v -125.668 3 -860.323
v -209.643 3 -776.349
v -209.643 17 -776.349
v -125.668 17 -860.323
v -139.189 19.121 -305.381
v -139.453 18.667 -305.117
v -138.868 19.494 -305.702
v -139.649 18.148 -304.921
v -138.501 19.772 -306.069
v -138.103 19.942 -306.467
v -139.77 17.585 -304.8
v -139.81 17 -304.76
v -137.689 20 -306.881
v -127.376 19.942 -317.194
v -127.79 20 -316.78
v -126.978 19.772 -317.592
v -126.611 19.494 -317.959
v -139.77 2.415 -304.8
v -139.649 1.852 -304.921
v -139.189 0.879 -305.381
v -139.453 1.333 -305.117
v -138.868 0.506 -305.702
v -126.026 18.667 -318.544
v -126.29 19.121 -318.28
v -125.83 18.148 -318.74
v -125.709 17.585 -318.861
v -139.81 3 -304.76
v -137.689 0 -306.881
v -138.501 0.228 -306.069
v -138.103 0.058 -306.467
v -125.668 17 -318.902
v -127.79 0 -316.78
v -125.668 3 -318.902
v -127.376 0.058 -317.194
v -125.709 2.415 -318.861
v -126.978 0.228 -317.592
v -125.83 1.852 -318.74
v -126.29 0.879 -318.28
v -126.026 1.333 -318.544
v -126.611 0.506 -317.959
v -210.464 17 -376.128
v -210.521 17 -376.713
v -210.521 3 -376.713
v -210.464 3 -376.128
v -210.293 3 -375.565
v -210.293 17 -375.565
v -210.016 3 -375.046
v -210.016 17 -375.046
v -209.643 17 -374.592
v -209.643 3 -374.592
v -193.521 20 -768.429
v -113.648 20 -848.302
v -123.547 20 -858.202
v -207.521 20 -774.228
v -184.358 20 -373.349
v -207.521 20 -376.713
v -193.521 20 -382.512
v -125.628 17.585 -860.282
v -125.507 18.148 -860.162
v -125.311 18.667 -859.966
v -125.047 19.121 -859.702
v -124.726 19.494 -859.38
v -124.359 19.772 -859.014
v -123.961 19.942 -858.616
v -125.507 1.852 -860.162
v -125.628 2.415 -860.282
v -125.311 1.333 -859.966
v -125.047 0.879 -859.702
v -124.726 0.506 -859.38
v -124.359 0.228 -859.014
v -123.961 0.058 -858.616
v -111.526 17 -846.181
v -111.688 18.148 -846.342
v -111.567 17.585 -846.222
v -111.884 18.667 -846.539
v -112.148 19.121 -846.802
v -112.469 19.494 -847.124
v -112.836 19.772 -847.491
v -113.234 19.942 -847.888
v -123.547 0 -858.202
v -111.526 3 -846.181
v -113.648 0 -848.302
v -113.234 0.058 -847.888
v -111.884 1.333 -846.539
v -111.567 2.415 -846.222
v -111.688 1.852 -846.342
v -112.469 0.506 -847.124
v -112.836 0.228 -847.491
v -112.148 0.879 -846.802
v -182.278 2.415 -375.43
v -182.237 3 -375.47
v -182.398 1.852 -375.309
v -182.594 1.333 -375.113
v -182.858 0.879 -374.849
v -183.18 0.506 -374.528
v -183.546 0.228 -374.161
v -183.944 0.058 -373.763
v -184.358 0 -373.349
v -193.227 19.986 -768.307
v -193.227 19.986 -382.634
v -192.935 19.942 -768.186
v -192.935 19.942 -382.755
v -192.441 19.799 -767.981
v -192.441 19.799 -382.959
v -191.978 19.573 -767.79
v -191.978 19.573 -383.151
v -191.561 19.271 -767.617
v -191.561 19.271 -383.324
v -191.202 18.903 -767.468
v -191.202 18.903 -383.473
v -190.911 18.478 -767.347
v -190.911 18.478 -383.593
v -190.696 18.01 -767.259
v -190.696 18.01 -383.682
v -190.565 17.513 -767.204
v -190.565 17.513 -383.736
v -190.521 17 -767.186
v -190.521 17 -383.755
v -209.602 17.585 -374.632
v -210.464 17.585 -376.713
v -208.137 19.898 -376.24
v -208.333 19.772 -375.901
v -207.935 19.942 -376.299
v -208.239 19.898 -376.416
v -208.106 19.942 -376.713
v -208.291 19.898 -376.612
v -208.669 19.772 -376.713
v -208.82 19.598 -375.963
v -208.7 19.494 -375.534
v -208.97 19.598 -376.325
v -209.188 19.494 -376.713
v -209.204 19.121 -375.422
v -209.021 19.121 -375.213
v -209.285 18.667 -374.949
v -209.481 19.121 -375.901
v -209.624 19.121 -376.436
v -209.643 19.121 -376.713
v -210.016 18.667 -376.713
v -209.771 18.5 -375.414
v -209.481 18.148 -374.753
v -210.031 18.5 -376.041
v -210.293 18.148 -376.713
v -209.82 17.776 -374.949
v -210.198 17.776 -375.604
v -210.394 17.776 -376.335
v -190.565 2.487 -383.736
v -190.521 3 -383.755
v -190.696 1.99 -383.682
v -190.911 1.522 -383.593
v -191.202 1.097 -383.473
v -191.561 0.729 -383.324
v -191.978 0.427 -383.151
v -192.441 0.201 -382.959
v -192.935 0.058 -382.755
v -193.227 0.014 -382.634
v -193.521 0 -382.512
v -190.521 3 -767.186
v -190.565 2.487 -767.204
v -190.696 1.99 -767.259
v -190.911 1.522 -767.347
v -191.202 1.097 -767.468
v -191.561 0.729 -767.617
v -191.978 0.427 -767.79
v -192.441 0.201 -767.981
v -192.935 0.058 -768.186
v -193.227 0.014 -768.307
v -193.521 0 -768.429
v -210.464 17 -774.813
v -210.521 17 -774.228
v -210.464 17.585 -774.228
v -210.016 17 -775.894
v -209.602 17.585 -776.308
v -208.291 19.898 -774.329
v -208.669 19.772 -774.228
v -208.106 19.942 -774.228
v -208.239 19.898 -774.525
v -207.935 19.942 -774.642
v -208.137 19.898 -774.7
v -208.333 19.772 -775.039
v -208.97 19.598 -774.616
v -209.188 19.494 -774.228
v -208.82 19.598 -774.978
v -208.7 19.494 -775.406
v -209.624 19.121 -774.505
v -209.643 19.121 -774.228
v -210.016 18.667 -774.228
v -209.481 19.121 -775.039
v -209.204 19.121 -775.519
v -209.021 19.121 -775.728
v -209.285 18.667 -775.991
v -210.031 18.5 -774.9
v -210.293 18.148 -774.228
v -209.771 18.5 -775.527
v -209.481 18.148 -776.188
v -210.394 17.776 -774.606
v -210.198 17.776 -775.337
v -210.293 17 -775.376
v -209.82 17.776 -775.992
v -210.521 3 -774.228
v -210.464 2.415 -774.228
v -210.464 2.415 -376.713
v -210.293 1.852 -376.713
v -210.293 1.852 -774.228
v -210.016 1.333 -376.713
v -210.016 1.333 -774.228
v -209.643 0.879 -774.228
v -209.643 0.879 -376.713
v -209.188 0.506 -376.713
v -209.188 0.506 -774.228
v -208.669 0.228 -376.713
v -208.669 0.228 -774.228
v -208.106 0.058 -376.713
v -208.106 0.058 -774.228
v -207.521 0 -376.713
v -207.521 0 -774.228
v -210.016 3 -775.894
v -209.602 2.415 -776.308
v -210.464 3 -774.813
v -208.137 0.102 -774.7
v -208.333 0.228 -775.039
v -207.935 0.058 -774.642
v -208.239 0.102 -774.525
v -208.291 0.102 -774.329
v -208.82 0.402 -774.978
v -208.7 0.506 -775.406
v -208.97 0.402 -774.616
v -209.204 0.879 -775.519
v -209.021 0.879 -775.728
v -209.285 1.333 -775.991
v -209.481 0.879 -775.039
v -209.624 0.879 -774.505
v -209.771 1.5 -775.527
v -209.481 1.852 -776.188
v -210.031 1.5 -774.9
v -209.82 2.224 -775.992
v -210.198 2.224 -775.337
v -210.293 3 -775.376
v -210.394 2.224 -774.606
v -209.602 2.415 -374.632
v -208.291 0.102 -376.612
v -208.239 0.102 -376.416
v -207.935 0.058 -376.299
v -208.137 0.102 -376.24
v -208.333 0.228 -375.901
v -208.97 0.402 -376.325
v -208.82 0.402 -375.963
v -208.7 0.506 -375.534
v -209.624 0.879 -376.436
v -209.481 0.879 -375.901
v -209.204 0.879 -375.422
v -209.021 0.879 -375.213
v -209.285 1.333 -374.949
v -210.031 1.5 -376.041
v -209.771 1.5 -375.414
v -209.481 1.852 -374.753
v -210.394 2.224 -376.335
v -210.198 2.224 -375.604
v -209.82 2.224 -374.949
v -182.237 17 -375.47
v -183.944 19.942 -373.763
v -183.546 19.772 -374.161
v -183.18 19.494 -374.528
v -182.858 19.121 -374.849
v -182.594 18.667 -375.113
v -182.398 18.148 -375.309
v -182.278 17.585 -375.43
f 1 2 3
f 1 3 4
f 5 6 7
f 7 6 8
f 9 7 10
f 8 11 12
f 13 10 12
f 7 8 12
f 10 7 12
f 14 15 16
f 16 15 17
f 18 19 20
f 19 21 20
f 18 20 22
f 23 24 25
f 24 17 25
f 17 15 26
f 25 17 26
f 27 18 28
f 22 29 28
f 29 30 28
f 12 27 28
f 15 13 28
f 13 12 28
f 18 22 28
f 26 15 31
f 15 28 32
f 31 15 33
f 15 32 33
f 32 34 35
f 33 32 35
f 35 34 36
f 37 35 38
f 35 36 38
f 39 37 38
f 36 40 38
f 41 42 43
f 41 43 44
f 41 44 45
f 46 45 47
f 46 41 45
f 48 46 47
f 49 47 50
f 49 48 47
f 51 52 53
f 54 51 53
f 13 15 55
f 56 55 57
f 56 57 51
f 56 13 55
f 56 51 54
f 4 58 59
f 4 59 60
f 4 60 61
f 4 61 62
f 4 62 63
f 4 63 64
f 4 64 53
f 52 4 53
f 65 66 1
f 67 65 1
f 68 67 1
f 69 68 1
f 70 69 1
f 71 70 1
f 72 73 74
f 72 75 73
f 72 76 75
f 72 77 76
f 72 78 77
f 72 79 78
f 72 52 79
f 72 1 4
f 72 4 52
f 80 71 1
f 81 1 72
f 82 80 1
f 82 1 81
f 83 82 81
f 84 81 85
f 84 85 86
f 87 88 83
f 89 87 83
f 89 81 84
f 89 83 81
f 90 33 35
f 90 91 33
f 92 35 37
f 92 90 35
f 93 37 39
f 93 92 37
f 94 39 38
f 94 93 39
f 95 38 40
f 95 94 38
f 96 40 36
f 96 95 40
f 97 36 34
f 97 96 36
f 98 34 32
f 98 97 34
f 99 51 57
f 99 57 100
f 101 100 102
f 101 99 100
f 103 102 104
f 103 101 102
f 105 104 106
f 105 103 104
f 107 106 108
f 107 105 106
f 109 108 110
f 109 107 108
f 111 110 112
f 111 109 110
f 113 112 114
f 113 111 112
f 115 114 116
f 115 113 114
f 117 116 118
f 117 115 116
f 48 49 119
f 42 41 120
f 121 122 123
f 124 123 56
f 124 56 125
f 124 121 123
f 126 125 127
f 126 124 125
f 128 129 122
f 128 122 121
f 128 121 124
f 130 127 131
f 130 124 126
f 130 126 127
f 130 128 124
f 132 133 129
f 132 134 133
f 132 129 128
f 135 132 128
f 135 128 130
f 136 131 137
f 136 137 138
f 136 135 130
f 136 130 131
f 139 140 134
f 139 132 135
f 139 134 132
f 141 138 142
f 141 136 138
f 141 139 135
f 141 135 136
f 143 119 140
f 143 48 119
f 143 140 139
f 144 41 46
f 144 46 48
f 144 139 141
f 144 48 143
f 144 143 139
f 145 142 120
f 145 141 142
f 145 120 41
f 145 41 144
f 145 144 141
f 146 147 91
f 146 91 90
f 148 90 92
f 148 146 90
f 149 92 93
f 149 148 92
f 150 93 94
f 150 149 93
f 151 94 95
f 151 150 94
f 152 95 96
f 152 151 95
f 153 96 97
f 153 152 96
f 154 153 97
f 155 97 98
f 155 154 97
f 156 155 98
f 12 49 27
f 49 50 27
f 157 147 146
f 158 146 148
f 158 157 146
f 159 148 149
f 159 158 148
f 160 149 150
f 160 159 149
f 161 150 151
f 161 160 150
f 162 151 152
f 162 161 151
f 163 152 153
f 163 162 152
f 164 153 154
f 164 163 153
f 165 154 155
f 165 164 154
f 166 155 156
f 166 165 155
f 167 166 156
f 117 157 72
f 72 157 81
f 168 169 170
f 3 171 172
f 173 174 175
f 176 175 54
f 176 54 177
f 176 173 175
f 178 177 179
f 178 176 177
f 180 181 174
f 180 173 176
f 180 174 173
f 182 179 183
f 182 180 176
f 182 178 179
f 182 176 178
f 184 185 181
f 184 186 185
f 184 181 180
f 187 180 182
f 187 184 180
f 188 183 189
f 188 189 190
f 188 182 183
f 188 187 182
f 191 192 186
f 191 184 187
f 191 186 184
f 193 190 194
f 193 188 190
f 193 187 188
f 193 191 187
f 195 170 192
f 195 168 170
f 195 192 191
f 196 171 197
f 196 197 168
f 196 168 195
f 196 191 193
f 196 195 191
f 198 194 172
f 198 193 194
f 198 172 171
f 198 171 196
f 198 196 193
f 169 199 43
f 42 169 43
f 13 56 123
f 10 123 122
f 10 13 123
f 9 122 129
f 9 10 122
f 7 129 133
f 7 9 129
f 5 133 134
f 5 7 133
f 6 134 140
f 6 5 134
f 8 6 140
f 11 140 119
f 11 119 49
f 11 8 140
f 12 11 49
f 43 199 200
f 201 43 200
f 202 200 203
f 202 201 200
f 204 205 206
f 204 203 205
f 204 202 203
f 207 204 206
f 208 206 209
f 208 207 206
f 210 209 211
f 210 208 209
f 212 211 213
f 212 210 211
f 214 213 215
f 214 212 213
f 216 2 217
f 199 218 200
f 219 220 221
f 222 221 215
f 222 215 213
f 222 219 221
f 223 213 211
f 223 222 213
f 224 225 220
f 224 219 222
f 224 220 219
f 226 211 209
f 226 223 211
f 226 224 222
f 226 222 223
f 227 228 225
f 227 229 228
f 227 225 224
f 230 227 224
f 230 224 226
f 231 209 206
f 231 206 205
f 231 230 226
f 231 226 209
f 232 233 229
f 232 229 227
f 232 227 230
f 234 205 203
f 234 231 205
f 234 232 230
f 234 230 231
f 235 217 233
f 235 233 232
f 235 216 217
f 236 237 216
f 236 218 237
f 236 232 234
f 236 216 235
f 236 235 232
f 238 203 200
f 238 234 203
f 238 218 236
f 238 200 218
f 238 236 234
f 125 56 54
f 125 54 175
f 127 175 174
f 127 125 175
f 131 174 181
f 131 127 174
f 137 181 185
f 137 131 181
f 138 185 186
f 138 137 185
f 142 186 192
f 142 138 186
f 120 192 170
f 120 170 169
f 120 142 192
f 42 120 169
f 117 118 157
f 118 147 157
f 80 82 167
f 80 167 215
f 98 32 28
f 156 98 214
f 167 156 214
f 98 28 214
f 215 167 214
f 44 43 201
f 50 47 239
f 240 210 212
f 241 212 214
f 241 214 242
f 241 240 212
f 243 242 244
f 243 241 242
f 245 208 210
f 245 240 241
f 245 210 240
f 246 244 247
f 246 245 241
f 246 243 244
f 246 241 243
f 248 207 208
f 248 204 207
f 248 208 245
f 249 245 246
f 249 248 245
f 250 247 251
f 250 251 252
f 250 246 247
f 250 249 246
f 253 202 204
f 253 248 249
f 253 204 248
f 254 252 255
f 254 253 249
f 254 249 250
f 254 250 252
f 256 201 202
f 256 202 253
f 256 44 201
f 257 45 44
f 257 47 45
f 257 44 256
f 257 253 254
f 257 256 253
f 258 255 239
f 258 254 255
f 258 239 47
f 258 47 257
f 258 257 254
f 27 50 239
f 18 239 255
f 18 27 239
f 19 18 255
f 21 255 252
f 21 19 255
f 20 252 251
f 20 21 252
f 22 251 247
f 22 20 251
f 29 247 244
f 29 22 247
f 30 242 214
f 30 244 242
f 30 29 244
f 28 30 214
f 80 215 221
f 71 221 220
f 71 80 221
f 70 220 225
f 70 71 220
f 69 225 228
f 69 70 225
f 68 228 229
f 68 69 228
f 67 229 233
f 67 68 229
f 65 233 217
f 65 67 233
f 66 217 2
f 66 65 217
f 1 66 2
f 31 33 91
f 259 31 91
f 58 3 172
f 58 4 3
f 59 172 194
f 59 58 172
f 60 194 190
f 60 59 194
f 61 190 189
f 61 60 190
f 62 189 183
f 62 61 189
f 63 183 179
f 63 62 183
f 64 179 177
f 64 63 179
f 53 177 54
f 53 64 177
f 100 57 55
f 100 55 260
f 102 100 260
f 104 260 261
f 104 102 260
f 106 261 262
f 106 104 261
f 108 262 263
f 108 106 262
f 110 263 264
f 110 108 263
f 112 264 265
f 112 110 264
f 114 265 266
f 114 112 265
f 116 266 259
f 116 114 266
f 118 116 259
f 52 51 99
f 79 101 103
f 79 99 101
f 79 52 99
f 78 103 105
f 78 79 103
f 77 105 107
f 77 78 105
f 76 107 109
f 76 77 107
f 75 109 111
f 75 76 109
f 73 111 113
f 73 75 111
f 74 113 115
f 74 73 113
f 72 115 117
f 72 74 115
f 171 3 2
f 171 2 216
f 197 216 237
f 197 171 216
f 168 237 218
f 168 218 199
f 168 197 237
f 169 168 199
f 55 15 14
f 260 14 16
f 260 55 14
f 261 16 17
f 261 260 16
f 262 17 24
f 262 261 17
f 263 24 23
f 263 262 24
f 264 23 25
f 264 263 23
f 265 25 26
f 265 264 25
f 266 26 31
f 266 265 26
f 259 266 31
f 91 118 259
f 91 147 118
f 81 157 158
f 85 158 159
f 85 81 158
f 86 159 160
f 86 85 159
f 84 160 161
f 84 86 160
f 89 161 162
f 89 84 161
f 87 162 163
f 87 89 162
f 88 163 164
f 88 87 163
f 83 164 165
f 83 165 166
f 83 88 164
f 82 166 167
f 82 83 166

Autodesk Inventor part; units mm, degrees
ref_plane "YZ Plane" through (0, 0, 0) normal (1, 0, 0) x (0, 1, 0)
ref_plane "XZ Plane" through (0, 0, 0) normal (0, 1, 0) x (-1, 0, 0)
ref_plane "XY Plane" through (0, 0, 0) normal (0, 0, 1) x (1, 0, 0)
sketch "Sketch1" plane through (0, 0, 0) normal (0, 1, 0) x (-1, 0, 0)
  line L0 (909.7546, -1043.3394) -> (909.7546, -1834.2484) construction
  line L1 (909.7546, -1834.2484) -> (468.795, -1834.2484) construction
  line L2 (468.795, -1834.2484) -> (468.795, -1043.3394) construction
  line L3 (468.795, -1043.3394) -> (909.7546, -1043.3394) construction
  line L4 (1047.8435, -175.8693) -> (1047.8435, -771.5628) construction
  line L5 (1047.8435, -771.5628) -> (636.4111, -771.5628) construction
  line L6 (636.4111, -771.5628) -> (636.4111, -175.8693) construction
  line L7 (636.4111, -175.8693) -> (1047.8435, -175.8693) construction
  line L8 (-89.4601, -69.3306) -> (230.5399, -69.3306) construction
  line L9 (210.5212, -775.4703) -> (125.6684, -860.3231)
  line L10 (210.5212, -775.4703) -> (330.5212, -775.4703) construction
  line L11 (125.6684, -860.3231) -> (111.5263, -846.181)
  line L12 (210.5212, -775.4703) -> (210.5212, -375.4703)
  line L13 (210.5212, -775.4703) -> (610.5212, -775.4703) construction
  line L14 (210.5212, -375.4703) -> (139.8105, -304.7596)
  line L15 (139.8105, -304.7596) -> (125.6684, -318.9018)
  line L16 (125.6684, -318.9018) -> (182.2369, -375.4703)
  line L17 (190.5212, -767.186) -> (111.5263, -846.181)
  line L18 (190.5212, -383.7546) -> (182.2369, -375.4703)
  line L19 (190.5212, -383.7546) -> (190.5212, -767.186)
  dimension "d55" = 135
  dimension "d56" = 20
  dimension "d60" = 90
  dimension "d61" = 100
  dimension "d62" = 20
  dimension "d63" = 90
  dimension "d64" = 80
extrude "Extrusion2" add sketch "Sketch1" along normal blind 20
fillet "Fillet1" radius 3 14 edges at (-175.1659, 20, -340.115) (-175.1659, 0, -340.115) (-210.5212, 10, -375.4703) (-210.5212, 20, -575.4703) (-210.5212, 0, -575.4703) (-190.5212, 20, -575.4703) (-153.9527, 20, -347.186) (-151.0237, 20, -806.6835) (-151.0237, 0, -806.6835) (-210.5212, 10, -775.4703) (-168.0948, 0, -817.8967) (-168.0948, 20, -817.8967) (-190.5212, 0, -575.4703) (-153.9527, 0, -347.186)
properties part number "Suspension"
